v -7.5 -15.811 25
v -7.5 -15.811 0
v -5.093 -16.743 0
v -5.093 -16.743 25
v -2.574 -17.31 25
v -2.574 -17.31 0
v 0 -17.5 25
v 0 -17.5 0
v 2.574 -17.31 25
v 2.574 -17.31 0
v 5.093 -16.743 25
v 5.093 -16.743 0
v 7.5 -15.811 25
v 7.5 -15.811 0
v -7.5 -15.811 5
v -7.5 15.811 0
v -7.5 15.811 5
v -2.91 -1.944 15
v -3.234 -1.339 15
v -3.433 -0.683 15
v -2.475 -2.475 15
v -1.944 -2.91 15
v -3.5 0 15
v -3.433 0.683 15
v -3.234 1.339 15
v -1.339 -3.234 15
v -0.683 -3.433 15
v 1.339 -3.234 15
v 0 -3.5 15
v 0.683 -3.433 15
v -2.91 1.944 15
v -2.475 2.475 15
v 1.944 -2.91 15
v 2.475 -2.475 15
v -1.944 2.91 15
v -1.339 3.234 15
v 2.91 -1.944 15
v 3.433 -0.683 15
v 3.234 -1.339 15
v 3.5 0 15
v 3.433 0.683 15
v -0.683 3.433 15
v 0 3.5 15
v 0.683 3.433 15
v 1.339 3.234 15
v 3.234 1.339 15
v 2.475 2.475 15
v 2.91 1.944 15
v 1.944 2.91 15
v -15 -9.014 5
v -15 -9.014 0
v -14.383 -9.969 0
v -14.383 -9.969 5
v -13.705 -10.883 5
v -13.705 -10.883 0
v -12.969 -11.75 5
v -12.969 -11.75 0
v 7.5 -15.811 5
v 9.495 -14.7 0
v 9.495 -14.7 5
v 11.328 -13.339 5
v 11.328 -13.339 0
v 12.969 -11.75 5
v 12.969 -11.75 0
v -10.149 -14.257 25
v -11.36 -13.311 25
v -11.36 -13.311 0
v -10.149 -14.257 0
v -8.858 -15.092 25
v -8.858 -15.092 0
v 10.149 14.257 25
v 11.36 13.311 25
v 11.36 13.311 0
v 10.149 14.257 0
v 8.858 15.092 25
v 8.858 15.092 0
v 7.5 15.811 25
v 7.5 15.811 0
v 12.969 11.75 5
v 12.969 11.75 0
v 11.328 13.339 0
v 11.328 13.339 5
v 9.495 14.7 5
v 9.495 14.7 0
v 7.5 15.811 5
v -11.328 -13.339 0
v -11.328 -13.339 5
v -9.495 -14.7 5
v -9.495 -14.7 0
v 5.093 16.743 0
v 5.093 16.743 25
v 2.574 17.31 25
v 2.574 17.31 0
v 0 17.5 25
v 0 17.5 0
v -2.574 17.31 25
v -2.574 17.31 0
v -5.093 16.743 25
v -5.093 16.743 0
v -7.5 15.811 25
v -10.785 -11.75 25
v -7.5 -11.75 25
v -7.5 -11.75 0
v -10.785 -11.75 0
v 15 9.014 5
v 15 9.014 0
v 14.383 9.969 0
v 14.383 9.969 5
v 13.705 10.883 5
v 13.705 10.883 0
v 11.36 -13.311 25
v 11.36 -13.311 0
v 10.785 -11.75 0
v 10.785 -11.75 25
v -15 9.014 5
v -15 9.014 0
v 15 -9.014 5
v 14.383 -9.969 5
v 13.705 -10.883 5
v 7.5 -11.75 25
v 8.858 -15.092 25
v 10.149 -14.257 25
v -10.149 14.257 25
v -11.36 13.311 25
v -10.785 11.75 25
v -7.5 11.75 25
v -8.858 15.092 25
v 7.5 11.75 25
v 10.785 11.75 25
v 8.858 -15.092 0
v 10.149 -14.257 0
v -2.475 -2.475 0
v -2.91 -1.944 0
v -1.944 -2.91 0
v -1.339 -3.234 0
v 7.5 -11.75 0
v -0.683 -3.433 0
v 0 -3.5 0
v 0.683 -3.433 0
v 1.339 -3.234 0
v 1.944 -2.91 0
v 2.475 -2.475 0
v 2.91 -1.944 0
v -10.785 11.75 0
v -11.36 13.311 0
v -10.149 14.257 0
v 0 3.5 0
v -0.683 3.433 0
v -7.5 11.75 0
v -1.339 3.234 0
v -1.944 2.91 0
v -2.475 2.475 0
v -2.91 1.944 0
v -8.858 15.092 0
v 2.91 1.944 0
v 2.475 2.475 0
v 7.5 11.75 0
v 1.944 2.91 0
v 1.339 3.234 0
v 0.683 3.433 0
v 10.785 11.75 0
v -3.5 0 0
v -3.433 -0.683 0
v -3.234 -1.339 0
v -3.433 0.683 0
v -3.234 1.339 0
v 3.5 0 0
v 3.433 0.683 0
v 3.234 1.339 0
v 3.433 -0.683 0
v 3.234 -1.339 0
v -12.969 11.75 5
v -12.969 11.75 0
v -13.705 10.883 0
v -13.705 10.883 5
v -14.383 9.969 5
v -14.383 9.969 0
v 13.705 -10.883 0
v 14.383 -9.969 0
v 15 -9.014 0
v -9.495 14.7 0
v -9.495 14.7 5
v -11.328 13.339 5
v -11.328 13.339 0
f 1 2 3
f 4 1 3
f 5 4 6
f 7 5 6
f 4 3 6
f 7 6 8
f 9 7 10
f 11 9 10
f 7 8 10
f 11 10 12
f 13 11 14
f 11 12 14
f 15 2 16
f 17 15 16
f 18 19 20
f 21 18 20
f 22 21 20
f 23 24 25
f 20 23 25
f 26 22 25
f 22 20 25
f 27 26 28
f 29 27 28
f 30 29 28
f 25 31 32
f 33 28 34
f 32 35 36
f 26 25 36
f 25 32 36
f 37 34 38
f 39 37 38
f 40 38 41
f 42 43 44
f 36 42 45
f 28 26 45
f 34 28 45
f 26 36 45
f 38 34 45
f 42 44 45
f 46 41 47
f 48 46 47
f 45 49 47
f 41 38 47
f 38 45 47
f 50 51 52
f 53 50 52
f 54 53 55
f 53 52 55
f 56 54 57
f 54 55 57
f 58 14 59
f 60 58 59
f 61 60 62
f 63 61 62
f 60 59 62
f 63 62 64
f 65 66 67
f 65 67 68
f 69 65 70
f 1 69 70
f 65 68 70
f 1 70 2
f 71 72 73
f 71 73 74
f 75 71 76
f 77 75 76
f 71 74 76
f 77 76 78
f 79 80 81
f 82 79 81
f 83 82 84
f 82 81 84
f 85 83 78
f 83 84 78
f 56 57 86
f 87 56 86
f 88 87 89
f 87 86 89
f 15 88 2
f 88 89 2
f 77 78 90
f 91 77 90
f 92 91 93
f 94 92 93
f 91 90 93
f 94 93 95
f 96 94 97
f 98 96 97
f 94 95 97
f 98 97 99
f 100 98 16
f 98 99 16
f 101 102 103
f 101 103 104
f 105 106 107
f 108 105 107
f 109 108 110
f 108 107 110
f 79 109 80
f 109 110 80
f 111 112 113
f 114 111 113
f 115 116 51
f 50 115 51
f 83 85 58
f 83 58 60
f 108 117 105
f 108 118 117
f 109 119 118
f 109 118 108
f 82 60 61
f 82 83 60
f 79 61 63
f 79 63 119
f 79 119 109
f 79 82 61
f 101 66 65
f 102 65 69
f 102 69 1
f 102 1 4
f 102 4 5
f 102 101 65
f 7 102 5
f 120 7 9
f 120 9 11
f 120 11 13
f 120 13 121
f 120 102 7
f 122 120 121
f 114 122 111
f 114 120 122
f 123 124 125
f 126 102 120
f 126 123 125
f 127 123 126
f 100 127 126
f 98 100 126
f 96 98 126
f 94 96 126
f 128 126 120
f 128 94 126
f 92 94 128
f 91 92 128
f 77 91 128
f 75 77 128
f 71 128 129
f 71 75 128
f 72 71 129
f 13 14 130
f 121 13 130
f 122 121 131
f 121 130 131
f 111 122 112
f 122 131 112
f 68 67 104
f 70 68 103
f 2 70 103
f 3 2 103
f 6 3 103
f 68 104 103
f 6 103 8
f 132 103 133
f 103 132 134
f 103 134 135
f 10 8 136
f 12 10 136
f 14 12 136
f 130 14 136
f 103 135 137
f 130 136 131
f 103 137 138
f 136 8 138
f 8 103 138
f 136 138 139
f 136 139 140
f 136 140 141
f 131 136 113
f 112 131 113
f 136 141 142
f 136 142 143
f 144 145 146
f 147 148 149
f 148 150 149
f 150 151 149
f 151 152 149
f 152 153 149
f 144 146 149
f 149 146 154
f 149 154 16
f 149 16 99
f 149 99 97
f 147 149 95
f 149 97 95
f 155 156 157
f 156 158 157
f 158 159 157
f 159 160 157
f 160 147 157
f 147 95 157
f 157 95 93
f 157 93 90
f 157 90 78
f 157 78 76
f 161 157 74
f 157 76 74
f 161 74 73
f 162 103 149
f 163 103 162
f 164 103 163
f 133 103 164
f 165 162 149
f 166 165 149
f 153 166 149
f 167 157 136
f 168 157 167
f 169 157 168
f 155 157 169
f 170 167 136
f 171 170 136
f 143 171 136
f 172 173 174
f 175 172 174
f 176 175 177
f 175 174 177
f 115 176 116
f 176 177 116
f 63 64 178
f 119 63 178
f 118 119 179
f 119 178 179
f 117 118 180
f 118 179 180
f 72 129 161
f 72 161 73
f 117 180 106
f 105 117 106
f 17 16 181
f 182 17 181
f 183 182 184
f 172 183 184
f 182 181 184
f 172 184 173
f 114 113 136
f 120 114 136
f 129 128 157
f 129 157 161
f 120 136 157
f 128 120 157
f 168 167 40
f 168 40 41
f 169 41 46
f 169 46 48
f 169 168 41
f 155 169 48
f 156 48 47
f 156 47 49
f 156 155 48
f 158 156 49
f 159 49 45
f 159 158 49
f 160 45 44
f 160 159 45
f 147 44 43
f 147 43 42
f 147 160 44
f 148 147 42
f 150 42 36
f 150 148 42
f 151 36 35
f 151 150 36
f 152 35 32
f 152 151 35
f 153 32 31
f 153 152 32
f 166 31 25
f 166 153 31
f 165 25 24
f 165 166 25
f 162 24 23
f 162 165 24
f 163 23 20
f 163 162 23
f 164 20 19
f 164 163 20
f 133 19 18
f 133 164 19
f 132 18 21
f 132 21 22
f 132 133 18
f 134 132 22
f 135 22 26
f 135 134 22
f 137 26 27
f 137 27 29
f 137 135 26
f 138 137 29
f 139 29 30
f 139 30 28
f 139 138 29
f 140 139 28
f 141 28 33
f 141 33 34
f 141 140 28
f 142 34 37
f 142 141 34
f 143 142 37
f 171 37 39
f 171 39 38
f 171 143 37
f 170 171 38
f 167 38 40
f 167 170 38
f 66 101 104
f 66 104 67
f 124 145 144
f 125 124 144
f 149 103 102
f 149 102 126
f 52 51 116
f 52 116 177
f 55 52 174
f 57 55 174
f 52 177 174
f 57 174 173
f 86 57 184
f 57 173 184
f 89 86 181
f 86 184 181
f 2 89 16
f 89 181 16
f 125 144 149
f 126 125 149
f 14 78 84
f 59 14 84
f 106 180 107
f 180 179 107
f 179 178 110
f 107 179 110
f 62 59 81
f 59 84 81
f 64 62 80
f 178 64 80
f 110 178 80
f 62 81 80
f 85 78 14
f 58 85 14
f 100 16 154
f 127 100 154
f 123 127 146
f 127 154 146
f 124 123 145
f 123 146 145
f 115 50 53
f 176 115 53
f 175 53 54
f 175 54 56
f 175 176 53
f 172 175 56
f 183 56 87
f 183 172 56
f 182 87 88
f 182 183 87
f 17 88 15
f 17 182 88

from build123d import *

# Parameters (mm, degrees)
F1_DEPTH    = 5
F0_W        = 15
F0_H        = 23.5
F0_R        = 3.5
F2_DEPTH    = 25
F3_T1_DEPTH = 36.3750267574
F4_DEPTH    = 15


# Not quite as in the source:
# - a fillet or chamfer that OpenCascade refuses, or shapes differently, is made with other operations: its cross-section is extruded or revolved along the edge and cut away or added
# - a feature names something its author has since deleted; it is built from what else it names


with BuildPart() as f1:
    # F0 (on Top) → F1 (new body)
    with BuildSketch(Plane.XY):
        with BuildLine():
            Line((15, -9.0138781887), (15, 9.0138781887))
            ThreePointArc((15, 9.0138781887), (14.0511141288, 10.4314999755), (12.9687123493, 11.75))
            Line((12.9687123493, 11.75), (7.5, 11.75))
            Line((7.5, 11.75), (7.5, -11.75))
            Line((7.5, -11.75), (12.9687123493, -11.75))
            ThreePointArc((12.9687123493, -11.75), (14.0511141288, -10.4314999755), (15, -9.0138781887))
        make_face()
        with BuildLine():
            ThreePointArc((7.5, -15.8113883008), (10.4338758399, -14.0493499834), (12.9687123493, -11.75))
            Line((12.9687123493, -11.75), (7.5, -11.75))
            Line((7.5, -11.75), (7.5, -15.8113883008))
        make_face()
        with BuildLine():
            Line((7.5, 11.75), (12.9687123493, 11.75))
            ThreePointArc((12.9687123493, 11.75), (10.4338758399, 14.0493499834), (7.5, 15.8113883008))
            Line((7.5, 15.8113883008), (7.5, 11.75))
        make_face()
    extrude(amount=F1_DEPTH)


with BuildPart() as f1b:
    # F0 (on Top) → F1, piece 2 (new body)
    with BuildSketch(Plane.XY):
        with BuildLine():
            Line((-7.5, -11.75), (-7.5, 11.75))
            Line((-7.5, 11.75), (-12.9687123493, 11.75))
            ThreePointArc((-12.9687123493, 11.75), (-14.0511141288, 10.4314999755), (-15, 9.0138781887))
            Line((-15, 9.0138781887), (-15, -9.0138781887))
            ThreePointArc((-15, -9.0138781887), (-14.0511141288, -10.4314999755), (-12.9687123493, -11.75))
            Line((-12.9687123493, -11.75), (-7.5, -11.75))
        make_face()
        with BuildLine():
            Line((-7.5, 11.75), (-7.5, 15.8113883008))
            ThreePointArc((-7.5, 15.8113883008), (-10.4338758399, 14.0493499834), (-12.9687123493, 11.75))
            Line((-12.9687123493, 11.75), (-7.5, 11.75))
        make_face()
        with BuildLine():
            ThreePointArc((-12.9687123493, -11.75), (-10.4338758399, -14.0493499834), (-7.5, -15.8113883008))
            Line((-7.5, -15.8113883008), (-7.5, -11.75))
            Line((-7.5, -11.75), (-12.9687123493, -11.75))
        make_face()
    extrude(amount=F1_DEPTH)


with BuildPart() as f2:
    # F0 (on Top) → F2 (new body)
    with BuildSketch(Plane.XY):
        Rectangle(F0_W, F0_H)
        Circle(F0_R, mode=Mode.SUBTRACT)
        with BuildLine():
            ThreePointArc((-12.9687123493, -11.75), (-10.4338758399, -14.0493499834), (-7.5, -15.8113883008))
            Line((-7.5, -15.8113883008), (-7.5, -11.75))
            Line((-7.5, -11.75), (-12.9687123493, -11.75))
        make_face()
        with BuildLine():
            Line((-7.5, 11.75), (-7.5, 15.8113883008))
            ThreePointArc((-7.5, 15.8113883008), (-10.4338758399, 14.0493499834), (-12.9687123493, 11.75))
            Line((-12.9687123493, 11.75), (-7.5, 11.75))
        make_face()
        with BuildLine():
            Line((7.5, 11.75), (12.9687123493, 11.75))
            ThreePointArc((12.9687123493, 11.75), (10.4338758399, 14.0493499834), (7.5, 15.8113883008))
            Line((7.5, 15.8113883008), (7.5, 11.75))
        make_face()
        with BuildLine():
            ThreePointArc((7.5, -15.8113883008), (10.4338758399, -14.0493499834), (12.9687123493, -11.75))
            Line((12.9687123493, -11.75), (7.5, -11.75))
            Line((7.5, -11.75), (7.5, -15.8113883008))
        make_face()
        with BuildLine():
            Line((7.5, 11.75), (7.5, 15.8113883008))
            ThreePointArc((7.5, 15.8113883008), (0, 17.5), (-7.5, 15.8113883008))
            Line((-7.5, 15.8113883008), (-7.5, 11.75))
            Line((-7.5, 11.75), (7.5, 11.75))
        make_face()
        with BuildLine():
            ThreePointArc((-7.5, -15.8113883008), (0, -17.5), (7.5, -15.8113883008))
            Line((7.5, -15.8113883008), (7.5, -11.75))
            Line((7.5, -11.75), (-7.5, -11.75))
            Line((-7.5, -11.75), (-7.5, -15.8113883008))
        make_face()
        Circle(F0_R)
    extrude(amount=F2_DEPTH)

    # F3: chamfer of 2 on 4 edges, made by hand

    # F3_s2 → F3_t1 (cut)
    with BuildSketch(Plane.XY.offset(-5.6875133787)):
        with BuildLine():
            Line((-10.7571586121, -11.6749396443), (-11.3881617362, -13.3863096005))
            Line((-11.3881617362, -13.3863096005), (-11.4141285615, -13.4167353131))
            ThreePointArc((-11.4141285615, -13.4167353131), (-12.2058182488, -12.5964122224), (-12.9983551204, -11.7768571429))
            Line((-12.9983551204, -11.7768571429), (-12.9687123493, -11.71))
            ThreePointArc((-12.9687123493, -11.71), (-11.8629354807, -11.71), (-10.7571586121, -11.6349396443))
            Line((-10.7571586121, -11.6349396443), (-10.7571586121, -11.6749396443))
        make_face()
        with BuildLine():
            Line((11.3881617362, -13.3863096005), (10.7571586121, -11.6749396443))
            Line((10.7571586121, -11.6749396443), (10.7571586121, -11.6349396443))
            ThreePointArc((10.7571586121, -11.6349396443), (11.8629354807, -11.71), (12.9687123493, -11.71))
            Line((12.9687123493, -11.71), (12.9983551204, -11.7768571429))
            ThreePointArc((12.9983551204, -11.7768571429), (12.2058182488, -12.5964122224), (11.4141285615, -13.4167353131))
            Line((11.4141285615, -13.4167353131), (11.3881617362, -13.3863096005))
        make_face()
        with BuildLine():
            Line((10.7571586121, 11.6749396443), (11.3881617362, 13.3863096005))
            Line((11.3881617362, 13.3863096005), (11.4141285615, 13.4167353131))
            ThreePointArc((11.4141285615, 13.4167353131), (12.2058182488, 12.5964122224), (12.9983551204, 11.7768571429))
            Line((12.9983551204, 11.7768571429), (12.9687123493, 11.71))
            ThreePointArc((12.9687123493, 11.71), (11.8629354807, 11.71), (10.7571586121, 11.6349396443))
            Line((10.7571586121, 11.6349396443), (10.7571586121, 11.6749396443))
        make_face()
        with BuildLine():
            Line((-11.3881617362, 13.3863096005), (-10.7571586121, 11.6749396443))
            Line((-10.7571586121, 11.6749396443), (-10.7571586121, 11.6349396443))
            ThreePointArc((-10.7571586121, 11.6349396443), (-11.8629354807, 11.71), (-12.9687123493, 11.71))
            Line((-12.9687123493, 11.71), (-12.9983551204, 11.7768571429))
            ThreePointArc((-12.9983551204, 11.7768571429), (-12.2058182488, 12.5964122224), (-11.4141285615, 13.4167353131))
            Line((-11.4141285615, 13.4167353131), (-11.3881617362, 13.3863096005))
        make_face()
    extrude(amount=F3_T1_DEPTH, mode=Mode.SUBTRACT)

    # F0 (on Top) → F4 (cut)
    with BuildSketch(Plane.XY):
        Circle(F0_R)
    extrude(amount=F4_DEPTH, mode=Mode.SUBTRACT)


solid = Compound([f1.part, f1b.part, f2.part])
